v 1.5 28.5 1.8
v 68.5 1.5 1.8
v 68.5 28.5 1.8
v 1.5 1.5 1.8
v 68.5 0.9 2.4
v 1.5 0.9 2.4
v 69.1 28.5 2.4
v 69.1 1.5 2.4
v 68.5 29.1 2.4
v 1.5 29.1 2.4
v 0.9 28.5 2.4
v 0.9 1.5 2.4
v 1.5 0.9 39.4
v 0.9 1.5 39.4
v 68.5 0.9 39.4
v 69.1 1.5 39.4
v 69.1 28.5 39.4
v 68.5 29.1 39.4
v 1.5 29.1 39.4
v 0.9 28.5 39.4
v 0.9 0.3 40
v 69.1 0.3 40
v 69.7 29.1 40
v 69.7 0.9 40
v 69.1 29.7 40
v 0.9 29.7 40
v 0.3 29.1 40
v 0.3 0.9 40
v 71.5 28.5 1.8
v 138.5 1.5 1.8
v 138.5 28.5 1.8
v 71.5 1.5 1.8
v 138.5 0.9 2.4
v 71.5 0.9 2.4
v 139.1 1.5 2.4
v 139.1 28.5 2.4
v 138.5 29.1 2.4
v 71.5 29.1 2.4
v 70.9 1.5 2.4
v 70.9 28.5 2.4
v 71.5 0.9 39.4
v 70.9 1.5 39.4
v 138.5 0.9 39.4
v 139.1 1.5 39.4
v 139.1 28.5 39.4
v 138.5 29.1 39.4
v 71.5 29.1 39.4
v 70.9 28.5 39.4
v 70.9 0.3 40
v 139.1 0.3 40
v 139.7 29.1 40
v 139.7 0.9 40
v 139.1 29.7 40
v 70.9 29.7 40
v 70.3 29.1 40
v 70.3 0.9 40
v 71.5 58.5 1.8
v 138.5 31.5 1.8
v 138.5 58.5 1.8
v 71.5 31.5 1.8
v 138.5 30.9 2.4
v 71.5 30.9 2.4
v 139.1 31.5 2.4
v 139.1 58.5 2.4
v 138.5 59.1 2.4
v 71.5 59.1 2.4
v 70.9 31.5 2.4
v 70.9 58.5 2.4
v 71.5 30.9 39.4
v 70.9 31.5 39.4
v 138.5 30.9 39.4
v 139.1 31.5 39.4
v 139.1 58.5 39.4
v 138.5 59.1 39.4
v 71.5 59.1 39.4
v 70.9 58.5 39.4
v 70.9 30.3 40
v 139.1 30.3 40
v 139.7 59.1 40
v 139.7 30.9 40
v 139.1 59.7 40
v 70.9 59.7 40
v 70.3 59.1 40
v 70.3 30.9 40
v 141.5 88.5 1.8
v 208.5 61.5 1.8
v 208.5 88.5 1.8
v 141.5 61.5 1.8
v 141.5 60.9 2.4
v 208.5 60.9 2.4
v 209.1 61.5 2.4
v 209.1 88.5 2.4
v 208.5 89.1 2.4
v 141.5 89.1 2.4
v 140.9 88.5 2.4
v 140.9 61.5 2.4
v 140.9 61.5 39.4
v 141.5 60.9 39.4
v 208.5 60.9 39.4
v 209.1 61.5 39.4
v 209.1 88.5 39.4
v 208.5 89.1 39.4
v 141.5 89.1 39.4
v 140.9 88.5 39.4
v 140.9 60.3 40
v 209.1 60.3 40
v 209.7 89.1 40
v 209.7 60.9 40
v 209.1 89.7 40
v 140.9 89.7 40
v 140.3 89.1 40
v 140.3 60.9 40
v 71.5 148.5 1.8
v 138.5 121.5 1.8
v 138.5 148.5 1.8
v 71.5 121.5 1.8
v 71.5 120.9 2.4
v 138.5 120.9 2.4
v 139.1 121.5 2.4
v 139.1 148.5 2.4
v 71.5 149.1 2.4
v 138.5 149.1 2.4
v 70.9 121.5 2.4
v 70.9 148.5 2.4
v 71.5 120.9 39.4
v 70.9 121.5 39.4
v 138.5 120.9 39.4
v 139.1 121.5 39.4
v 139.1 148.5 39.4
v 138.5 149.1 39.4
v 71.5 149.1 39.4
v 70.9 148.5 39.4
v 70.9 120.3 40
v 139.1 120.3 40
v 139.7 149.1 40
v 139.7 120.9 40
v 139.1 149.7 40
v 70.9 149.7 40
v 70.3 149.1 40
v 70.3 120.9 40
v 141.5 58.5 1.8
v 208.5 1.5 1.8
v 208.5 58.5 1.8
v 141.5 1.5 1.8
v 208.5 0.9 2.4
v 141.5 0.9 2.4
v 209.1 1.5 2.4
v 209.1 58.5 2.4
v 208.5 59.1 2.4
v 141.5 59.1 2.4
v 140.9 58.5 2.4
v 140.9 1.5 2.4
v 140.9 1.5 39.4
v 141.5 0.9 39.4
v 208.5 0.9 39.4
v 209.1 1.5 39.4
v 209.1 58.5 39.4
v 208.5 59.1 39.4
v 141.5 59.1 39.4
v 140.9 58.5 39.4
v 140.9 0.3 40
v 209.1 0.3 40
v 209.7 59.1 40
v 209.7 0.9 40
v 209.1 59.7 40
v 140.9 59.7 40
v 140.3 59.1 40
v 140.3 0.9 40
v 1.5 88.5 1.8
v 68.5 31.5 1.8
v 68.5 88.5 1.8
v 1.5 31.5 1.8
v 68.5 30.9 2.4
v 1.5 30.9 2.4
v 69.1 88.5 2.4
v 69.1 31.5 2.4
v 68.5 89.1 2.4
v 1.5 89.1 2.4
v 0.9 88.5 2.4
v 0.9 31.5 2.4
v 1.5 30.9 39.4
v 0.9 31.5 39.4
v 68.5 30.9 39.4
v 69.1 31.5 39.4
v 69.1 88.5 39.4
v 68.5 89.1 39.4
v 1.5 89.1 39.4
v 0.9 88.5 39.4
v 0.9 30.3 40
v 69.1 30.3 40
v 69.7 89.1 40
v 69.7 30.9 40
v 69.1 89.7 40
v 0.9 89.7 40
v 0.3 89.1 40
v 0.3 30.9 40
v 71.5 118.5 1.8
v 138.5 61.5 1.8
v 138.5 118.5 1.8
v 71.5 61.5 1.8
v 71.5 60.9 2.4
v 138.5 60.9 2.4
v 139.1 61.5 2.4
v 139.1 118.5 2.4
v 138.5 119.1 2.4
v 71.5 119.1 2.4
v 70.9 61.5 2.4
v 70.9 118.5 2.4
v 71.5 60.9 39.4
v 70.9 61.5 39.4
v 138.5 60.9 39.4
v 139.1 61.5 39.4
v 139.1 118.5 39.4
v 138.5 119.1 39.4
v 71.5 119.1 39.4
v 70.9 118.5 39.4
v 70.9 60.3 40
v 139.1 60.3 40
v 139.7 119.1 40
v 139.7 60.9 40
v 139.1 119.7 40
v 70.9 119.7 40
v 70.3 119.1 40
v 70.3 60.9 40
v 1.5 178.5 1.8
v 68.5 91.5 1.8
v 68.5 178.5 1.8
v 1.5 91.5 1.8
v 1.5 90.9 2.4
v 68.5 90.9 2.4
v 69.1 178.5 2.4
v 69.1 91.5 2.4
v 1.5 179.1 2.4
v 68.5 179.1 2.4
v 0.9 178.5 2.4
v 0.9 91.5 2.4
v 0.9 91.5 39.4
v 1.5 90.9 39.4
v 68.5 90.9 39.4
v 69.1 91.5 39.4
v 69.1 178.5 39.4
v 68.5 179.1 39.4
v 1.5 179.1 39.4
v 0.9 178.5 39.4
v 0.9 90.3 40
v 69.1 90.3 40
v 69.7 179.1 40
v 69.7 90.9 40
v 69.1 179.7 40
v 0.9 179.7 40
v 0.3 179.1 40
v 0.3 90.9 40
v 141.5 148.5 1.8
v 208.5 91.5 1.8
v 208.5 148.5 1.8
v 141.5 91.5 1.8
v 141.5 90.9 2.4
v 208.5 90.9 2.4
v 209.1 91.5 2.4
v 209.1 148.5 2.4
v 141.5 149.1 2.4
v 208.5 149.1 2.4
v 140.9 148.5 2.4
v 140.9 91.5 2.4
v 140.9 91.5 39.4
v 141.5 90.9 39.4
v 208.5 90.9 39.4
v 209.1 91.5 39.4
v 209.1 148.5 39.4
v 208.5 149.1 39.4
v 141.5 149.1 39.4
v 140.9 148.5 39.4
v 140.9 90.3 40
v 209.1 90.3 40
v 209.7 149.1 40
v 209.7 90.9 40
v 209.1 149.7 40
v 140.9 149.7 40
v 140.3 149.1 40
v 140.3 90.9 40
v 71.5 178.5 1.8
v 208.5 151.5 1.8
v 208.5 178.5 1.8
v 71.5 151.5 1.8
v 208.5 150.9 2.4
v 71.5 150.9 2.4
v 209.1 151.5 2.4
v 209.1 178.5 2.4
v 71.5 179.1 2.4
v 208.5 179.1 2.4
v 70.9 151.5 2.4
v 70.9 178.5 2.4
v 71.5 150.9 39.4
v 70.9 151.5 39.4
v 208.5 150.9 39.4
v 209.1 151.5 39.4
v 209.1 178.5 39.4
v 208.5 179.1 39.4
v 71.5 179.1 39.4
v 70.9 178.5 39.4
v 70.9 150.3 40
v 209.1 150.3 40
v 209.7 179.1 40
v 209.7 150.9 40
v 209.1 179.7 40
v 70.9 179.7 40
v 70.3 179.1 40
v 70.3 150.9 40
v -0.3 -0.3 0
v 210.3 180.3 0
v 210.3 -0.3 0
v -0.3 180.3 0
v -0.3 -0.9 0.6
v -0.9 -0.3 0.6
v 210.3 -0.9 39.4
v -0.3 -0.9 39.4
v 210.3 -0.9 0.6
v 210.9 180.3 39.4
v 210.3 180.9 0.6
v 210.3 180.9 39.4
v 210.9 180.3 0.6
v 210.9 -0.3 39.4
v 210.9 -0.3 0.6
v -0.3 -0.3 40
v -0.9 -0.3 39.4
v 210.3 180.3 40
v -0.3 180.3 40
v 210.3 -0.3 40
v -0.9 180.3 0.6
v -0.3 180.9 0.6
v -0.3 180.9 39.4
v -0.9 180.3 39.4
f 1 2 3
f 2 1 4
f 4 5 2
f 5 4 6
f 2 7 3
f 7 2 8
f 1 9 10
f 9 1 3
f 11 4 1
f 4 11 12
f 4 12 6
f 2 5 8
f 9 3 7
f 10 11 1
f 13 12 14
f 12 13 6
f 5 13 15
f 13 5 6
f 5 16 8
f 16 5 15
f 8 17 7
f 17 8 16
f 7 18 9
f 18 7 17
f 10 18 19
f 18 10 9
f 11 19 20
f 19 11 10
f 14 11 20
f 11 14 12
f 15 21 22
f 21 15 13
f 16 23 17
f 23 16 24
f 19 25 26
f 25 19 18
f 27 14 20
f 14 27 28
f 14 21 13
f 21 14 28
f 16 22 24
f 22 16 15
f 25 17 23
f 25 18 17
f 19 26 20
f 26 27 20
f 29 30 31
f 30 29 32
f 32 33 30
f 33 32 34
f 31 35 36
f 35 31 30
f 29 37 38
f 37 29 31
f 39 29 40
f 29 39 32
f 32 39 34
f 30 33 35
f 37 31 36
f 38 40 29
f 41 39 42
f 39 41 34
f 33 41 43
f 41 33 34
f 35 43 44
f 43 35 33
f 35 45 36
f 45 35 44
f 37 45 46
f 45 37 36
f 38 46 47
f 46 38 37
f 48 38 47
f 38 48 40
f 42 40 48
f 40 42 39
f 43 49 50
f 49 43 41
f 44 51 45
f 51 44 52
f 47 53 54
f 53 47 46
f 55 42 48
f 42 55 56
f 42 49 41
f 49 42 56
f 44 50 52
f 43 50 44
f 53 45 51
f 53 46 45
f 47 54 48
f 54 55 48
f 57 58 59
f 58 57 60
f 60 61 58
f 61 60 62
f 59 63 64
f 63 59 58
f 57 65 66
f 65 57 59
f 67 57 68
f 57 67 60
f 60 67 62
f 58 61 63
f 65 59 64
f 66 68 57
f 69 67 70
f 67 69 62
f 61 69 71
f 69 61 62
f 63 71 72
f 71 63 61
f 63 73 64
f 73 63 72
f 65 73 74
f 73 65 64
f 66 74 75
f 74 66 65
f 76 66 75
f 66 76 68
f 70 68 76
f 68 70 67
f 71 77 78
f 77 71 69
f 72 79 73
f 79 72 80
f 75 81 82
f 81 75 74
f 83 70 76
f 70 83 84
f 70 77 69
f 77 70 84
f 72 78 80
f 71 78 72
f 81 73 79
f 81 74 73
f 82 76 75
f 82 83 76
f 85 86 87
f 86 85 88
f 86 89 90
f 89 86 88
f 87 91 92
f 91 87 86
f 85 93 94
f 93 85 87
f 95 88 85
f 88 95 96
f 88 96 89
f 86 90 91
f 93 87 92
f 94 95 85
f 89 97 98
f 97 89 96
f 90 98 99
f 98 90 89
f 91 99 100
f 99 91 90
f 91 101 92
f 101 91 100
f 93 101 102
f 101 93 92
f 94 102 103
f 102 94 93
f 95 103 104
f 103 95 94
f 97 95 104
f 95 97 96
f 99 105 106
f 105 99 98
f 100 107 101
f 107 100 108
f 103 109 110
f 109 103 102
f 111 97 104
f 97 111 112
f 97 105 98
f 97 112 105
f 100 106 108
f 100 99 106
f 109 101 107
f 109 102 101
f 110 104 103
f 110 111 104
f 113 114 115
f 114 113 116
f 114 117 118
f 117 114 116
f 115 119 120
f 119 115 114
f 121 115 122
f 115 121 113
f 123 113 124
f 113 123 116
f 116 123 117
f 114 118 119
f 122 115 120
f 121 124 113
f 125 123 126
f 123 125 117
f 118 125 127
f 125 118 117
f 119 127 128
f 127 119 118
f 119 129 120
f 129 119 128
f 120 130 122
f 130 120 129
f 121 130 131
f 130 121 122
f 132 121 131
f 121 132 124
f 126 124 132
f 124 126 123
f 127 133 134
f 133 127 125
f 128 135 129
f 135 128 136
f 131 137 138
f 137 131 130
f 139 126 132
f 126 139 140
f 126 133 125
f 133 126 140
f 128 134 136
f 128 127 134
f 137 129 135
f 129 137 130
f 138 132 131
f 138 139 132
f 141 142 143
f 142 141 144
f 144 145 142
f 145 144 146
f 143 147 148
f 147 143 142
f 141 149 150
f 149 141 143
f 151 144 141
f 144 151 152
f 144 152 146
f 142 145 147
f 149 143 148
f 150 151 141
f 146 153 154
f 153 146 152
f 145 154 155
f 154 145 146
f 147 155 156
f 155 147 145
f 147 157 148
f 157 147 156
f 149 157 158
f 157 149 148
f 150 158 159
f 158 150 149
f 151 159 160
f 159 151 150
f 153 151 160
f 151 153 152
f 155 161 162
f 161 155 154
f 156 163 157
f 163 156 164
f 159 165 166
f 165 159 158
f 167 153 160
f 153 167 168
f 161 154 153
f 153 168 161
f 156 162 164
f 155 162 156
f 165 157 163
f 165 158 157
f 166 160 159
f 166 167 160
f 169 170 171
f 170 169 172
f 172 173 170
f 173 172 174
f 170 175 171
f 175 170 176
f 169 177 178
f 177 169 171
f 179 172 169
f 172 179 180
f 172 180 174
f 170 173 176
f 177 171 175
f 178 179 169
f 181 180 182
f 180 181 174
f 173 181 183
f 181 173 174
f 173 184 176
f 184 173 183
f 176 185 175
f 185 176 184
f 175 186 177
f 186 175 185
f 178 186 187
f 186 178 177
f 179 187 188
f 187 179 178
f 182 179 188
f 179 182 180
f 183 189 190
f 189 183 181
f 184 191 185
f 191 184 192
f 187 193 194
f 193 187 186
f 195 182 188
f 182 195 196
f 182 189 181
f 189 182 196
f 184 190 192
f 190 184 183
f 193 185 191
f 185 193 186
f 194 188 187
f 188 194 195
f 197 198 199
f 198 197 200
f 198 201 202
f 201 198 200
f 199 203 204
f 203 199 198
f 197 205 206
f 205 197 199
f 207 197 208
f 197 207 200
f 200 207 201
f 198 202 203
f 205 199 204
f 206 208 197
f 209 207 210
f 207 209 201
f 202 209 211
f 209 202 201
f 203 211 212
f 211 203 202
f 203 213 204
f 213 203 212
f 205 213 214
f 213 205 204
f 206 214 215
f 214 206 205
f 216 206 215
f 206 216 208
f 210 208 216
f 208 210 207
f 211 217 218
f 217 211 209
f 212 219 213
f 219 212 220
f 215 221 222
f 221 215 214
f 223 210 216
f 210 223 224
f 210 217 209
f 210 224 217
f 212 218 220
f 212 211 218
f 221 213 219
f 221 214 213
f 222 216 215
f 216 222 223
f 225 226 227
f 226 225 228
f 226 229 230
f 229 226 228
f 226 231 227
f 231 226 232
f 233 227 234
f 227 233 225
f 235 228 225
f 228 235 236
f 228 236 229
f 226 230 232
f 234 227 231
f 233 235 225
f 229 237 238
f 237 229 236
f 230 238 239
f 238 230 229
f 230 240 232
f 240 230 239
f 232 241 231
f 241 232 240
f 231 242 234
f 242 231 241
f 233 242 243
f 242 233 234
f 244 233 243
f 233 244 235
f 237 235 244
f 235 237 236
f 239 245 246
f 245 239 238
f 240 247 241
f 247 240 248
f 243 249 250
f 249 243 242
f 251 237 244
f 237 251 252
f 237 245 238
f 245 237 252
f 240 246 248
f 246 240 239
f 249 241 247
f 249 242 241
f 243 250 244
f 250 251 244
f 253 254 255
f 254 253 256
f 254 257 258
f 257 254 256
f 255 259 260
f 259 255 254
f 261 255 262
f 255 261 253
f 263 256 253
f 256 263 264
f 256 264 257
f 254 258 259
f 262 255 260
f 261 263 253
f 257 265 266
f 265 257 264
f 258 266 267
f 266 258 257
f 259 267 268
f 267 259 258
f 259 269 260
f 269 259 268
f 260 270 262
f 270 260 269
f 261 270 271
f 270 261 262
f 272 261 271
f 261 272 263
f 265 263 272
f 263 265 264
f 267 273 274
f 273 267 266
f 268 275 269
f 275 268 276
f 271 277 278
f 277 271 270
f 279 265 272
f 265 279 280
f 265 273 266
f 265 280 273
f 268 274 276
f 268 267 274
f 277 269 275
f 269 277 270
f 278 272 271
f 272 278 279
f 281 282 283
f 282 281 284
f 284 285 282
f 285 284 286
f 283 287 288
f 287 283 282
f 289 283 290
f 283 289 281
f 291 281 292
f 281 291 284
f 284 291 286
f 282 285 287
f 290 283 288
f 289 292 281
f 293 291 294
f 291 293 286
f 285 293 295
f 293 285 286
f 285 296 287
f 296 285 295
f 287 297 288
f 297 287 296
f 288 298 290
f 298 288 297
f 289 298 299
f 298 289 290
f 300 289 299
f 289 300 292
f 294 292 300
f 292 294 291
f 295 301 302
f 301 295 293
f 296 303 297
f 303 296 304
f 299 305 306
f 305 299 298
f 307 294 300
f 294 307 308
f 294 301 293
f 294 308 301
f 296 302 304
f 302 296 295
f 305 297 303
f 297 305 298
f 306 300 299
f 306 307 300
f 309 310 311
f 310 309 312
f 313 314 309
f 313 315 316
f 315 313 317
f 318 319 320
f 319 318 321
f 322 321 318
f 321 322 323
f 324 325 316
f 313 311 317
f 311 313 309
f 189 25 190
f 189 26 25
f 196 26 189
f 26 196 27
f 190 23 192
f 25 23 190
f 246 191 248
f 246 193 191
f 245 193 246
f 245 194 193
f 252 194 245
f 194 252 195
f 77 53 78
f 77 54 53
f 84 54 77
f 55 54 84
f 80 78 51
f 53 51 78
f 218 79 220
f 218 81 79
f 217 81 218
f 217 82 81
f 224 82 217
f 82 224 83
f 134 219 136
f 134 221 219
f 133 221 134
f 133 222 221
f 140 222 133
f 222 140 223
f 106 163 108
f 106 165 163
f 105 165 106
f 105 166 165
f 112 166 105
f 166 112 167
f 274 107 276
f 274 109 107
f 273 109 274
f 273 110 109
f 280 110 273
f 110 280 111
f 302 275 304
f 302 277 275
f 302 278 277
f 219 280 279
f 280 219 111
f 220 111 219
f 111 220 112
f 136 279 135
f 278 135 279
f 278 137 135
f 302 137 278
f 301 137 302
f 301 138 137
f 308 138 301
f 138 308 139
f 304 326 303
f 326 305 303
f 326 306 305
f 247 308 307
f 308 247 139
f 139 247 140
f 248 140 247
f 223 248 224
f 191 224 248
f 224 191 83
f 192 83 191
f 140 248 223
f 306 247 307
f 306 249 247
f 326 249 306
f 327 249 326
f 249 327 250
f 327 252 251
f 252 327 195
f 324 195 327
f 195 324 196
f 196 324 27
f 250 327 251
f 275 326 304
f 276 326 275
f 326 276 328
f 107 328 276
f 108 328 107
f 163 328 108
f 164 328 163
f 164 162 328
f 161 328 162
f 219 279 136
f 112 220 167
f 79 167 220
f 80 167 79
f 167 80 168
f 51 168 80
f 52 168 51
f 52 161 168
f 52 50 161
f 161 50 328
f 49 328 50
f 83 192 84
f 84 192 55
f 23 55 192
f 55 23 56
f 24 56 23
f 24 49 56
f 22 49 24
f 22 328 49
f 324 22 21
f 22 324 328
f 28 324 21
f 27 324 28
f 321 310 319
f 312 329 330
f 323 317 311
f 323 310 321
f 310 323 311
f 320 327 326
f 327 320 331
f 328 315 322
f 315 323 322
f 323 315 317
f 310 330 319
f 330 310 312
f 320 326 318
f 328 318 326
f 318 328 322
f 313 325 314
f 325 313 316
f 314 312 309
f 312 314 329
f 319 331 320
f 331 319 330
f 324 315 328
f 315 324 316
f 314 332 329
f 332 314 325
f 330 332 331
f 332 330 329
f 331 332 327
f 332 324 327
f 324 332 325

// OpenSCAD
// file: ../functions/vectors2D.scad
/* * * * * * * * * * * * * * * * * * * * * * * * * * * * * * * * * * * * *\
 * Copyright (C) Claus Schrammel <claus@f05fk.net>                       *
 *                                                                       *
 * This program is free software: you can redistribute it and/or modify  *
 * it under the terms of the GNU General Public License as published by  *
 * the Free Software Foundation, either version 3 of the License, or     *
 * (at your option) any later version.                                   *
 *                                                                       *
 * This program is distributed in the hope that it will be useful,       *
 * but WITHOUT ANY WARRANTY; without even the implied warranty of        *
 * MERCHANTABILITY or FITNESS FOR A PARTICULAR PURPOSE.  See the         *
 * GNU General Public License for more details.                          *
 *                                                                       *
 * You should have received a copy of the GNU General Public License     *
 * along with this program.  If not, see <http://www.gnu.org/licenses/>. *
 *                                                                       *
 * SPDX-License-Identifier: GPL-3.0-or-later                             *
\* * * * * * * * * * * * * * * * * * * * * * * * * * * * * * * * * * * * */

include <utils.scad>

function normal_vector_2D(vector) = [-vector.y, vector.x];
function unit_vector_2D(vector) = vector / norm(vector);

/*
 * Calculates the coefficient for v1 to get from p1 to the intersection point of the two lines p1/v1 and p2/v2:
 * intersection_point = p1 + v1 * intersection_coefficient1.
 */
function intersection_coefficient1(p1, v1, p2, v2) = ( v2.x * (p1.y - p2.y) - v2.y * (p1.x - p2.x) ) / (v1.x * v2.y - v1.y * v2.x);

/*
 * Calculates the coefficient for v2 to get from p2 to the intersection point of the two lines p1/v1 and p2/v2:
 * intersection_point = p2 + v2 * intersection_coefficient2.
 */
function intersection_coefficient2(p1, v1, p2, v2) = intersection_coefficient1(p2, v2, p1, v1);

/*
 * Calculates the intersection point of the two lines p1/v1 and p2/v2.
 */
function intersection_point(p1, v1, p2, v2) = p1 + v1 * intersection_coefficient1(p1, v1, p2, v2);
// file: ../functions/utils.scad
/* * * * * * * * * * * * * * * * * * * * * * * * * * * * * * * * * * * * *\
 * Copyright (C) Claus Schrammel <claus@f05fk.net>                       *
 *                                                                       *
 * This program is free software: you can redistribute it and/or modify  *
 * it under the terms of the GNU General Public License as published by  *
 * the Free Software Foundation, either version 3 of the License, or     *
 * (at your option) any later version.                                   *
 *                                                                       *
 * This program is distributed in the hope that it will be useful,       *
 * but WITHOUT ANY WARRANTY; without even the implied warranty of        *
 * MERCHANTABILITY or FITNESS FOR A PARTICULAR PURPOSE.  See the         *
 * GNU General Public License for more details.                          *
 *                                                                       *
 * You should have received a copy of the GNU General Public License     *
 * along with this program.  If not, see <http://www.gnu.org/licenses/>. *
 *                                                                       *
 * SPDX-License-Identifier: GPL-3.0-or-later                             *
\* * * * * * * * * * * * * * * * * * * * * * * * * * * * * * * * * * * * */

// the modulo operator % creates negative results for negative inputs n
function modulo(n, m) = ((n % m) + m) % m;

function cyclic_array(array, index) = array[modulo(index, len(array))];
// file: ../functions/polygons.scad
/* * * * * * * * * * * * * * * * * * * * * * * * * * * * * * * * * * * * *\
 * Copyright (C) Claus Schrammel <claus@f05fk.net>                       *
 *                                                                       *
 * This program is free software: you can redistribute it and/or modify  *
 * it under the terms of the GNU General Public License as published by  *
 * the Free Software Foundation, either version 3 of the License, or     *
 * (at your option) any later version.                                   *
 *                                                                       *
 * This program is distributed in the hope that it will be useful,       *
 * but WITHOUT ANY WARRANTY; without even the implied warranty of        *
 * MERCHANTABILITY or FITNESS FOR A PARTICULAR PURPOSE.  See the         *
 * GNU General Public License for more details.                          *
 *                                                                       *
 * You should have received a copy of the GNU General Public License     *
 * along with this program.  If not, see <http://www.gnu.org/licenses/>. *
 *                                                                       *
 * SPDX-License-Identifier: GPL-3.0-or-later                             *
\* * * * * * * * * * * * * * * * * * * * * * * * * * * * * * * * * * * * */

include <utils.scad>
include <vectors2D.scad>

/*
 * Shrinks the polygon by moving the edges "inwards" by the given distance.
 * The points need to be given in the counter-clockwise order, i.e. applying the
 * right-hand rule with the thumb pointing in the z direction.
 */
function shrink_edges(points, distance) =
    [ for (i = [0 : 1 : len(points) - 1])
        let (p1 = cyclic_array(points, i - 1), p2 = cyclic_array(points, i), p3 = cyclic_array(points, i + 1),
                v1 = p2 - p1, v2 = p3 - p2,
                n1 = unit_vector_2D(normal_vector_2D(v1)), n2 = unit_vector_2D(normal_vector_2D(v2)))
            intersection_point(p1 + n1 * distance, v1, p2 + n2 * distance, v2)
    ];

/*
 * Grows the polygon by moving the edges "outwards" by the given distance.
 * The points need to be given in the counter-clockwise order, i.e. applying the
 * right-hand rule with the thumb pointing in the z direction.
 */
function grow_edges(points, distance) = shrink_edges(points, -distance);

/*
 * Flattens the corners of the polygon by cutting off at the intersection points where one of the edges
 * is moved "inwards" by the given distance, while the other edge is not, and vice-versa.
 * The points need to be given in the counter-clockwise order, i.e. applying the
 * right-hand rule with the thumb pointing in the z direction.
 */
function flatten_corners(points, distance) = 
    [ for (i = [0 : 1 : len(points) - 1])
        let (p1 = cyclic_array(points, i - 1), p2 = cyclic_array(points, i), p3 = cyclic_array(points, i + 1),
                v1 = p2 - p1, v2 = p3 - p2,
                n1 = unit_vector_2D(normal_vector_2D(v1)), n2 = unit_vector_2D(normal_vector_2D(v2)))
            each [
                intersection_point(p1, v1, p2 + n2 * distance, v2),
                intersection_point(p1 + n1 * distance, v1, p2, v2)
            ]
    ];
// main file
/* * * * * * * * * * * * * * * * * * * * * * * * * * * * * * * * * * * * *\
 * Copyright (C) Claus Schrammel <claus@f05fk.net>                       *
 *                                                                       *
 * This program is free software: you can redistribute it and/or modify  *
 * it under the terms of the GNU General Public License as published by  *
 * the Free Software Foundation, either version 3 of the License, or     *
 * (at your option) any later version.                                   *
 *                                                                       *
 * This program is distributed in the hope that it will be useful,       *
 * but WITHOUT ANY WARRANTY; without even the implied warranty of        *
 * MERCHANTABILITY or FITNESS FOR A PARTICULAR PURPOSE.  See the         *
 * GNU General Public License for more details.                          *
 *                                                                       *
 * You should have received a copy of the GNU General Public License     *
 * along with this program.  If not, see <http://www.gnu.org/licenses/>. *
 *                                                                       *
 * SPDX-License-Identifier: GPL-3.0-or-later                             *
\* * * * * * * * * * * * * * * * * * * * * * * * * * * * * * * * * * * * */

use <../modules/PrismaChamfered.scad>

DEPTH = 40;
CELL_WIDTH = 70;
CELL_HEIGHT = 30;
THICKNESS = 1.8;
DELTA = THICKNESS / 2;
CHAMFER = 0.6;

x0a = 0 * CELL_WIDTH - DELTA;
x0b = 0 * CELL_WIDTH + DELTA;
x1a = 1 * CELL_WIDTH - DELTA;
x1b = 1 * CELL_WIDTH + DELTA;
x2a = 2 * CELL_WIDTH - DELTA;
x2b = 2 * CELL_WIDTH + DELTA;
x3a = 3 * CELL_WIDTH - DELTA;
x3b = 3 * CELL_WIDTH + DELTA;

y0a = 0 * CELL_HEIGHT - DELTA;
y0b = 0 * CELL_HEIGHT + DELTA;
y1a = 1 * CELL_HEIGHT - DELTA;
y1b = 1 * CELL_HEIGHT + DELTA;
y2a = 2 * CELL_HEIGHT - DELTA;
y2b = 2 * CELL_HEIGHT + DELTA;
y3a = 3 * CELL_HEIGHT - DELTA;
y3b = 3 * CELL_HEIGHT + DELTA;
y4a = 4 * CELL_HEIGHT - DELTA;
y4b = 4 * CELL_HEIGHT + DELTA;
y5a = 5 * CELL_HEIGHT - DELTA;
y5b = 5 * CELL_HEIGHT + DELTA;
y6a = 6 * CELL_HEIGHT - DELTA;
y6b = 6 * CELL_HEIGHT + DELTA;

difference() {
    PrismaChamfered(points = sqre(x0a, y0a, x3b, y6b), height = DEPTH, chamfer = CHAMFER);

    translate([0, 0, THICKNESS]) {
        // row 1
        PrismaChamfered(points = sqre(x0b, y0b, x1a, y1a), height = DEPTH - THICKNESS, chamfer = CHAMFER, invert_top = true);
        PrismaChamfered(points = sqre(x1b, y0b, x2a, y1a), height = DEPTH - THICKNESS, chamfer = CHAMFER, invert_top = true);
        //PrismaChamfered(points = sqre(x2b, y0b, x3a, y1a), height = DEPTH - THICKNESS, chamfer = CHAMFER, invert_top = true);
        // row 2
        //PrismaChamfered(points = sqre(x0b, y1b, x1a, y2a), height = DEPTH - THICKNESS, chamfer = CHAMFER, invert_top = true);
        PrismaChamfered(points = sqre(x1b, y1b, x2a, y2a), height = DEPTH - THICKNESS, chamfer = CHAMFER, invert_top = true);
        //PrismaChamfered(points = sqre(x2b, y1b, x3a, y2a), height = DEPTH - THICKNESS, chamfer = CHAMFER, invert_top = true);
        // row 3
        //PrismaChamfered(points = sqre(x0b, y2b, x1a, y3a), height = DEPTH - THICKNESS, chamfer = CHAMFER, invert_top = true);
        //PrismaChamfered(points = sqre(x1b, y2b, x2a, y3a), height = DEPTH - THICKNESS, chamfer = CHAMFER, invert_top = true);
        PrismaChamfered(points = sqre(x2b, y2b, x3a, y3a), height = DEPTH - THICKNESS, chamfer = CHAMFER, invert_top = true);
        // row 4
        //PrismaChamfered(points = sqre(x0b, y3b, x1a, y4a), height = DEPTH - THICKNESS, chamfer = CHAMFER, invert_top = true);
        //PrismaChamfered(points = sqre(x1b, y3b, x2a, y4a), height = DEPTH - THICKNESS, chamfer = CHAMFER, invert_top = true);
        //PrismaChamfered(points = sqre(x2b, y3b, x3a, y4a), height = DEPTH - THICKNESS, chamfer = CHAMFER, invert_top = true);
        // row 5
        //PrismaChamfered(points = sqre(x0b, y4b, x1a, y5a), height = DEPTH - THICKNESS, chamfer = CHAMFER, invert_top = true);
        PrismaChamfered(points = sqre(x1b, y4b, x2a, y5a), height = DEPTH - THICKNESS, chamfer = CHAMFER, invert_top = true);
        //PrismaChamfered(points = sqre(x2b, y4b, x3a, y5a), height = DEPTH - THICKNESS, chamfer = CHAMFER, invert_top = true);
        // row 6
        //PrismaChamfered(points = sqre(x0b, y5b, x1a, y6a), height = DEPTH - THICKNESS, chamfer = CHAMFER, invert_top = true);
        //PrismaChamfered(points = sqre(x1b, y5b, x2a, y6a), height = DEPTH - THICKNESS, chamfer = CHAMFER, invert_top = true);
        //PrismaChamfered(points = sqre(x2b, y5b, x3a, y6a), height = DEPTH - THICKNESS, chamfer = CHAMFER, invert_top = true);
        // special fields

        PrismaChamfered(points = sqre(x2b, y0b, x3a, y2a), height = DEPTH - THICKNESS, chamfer = CHAMFER, invert_top = true);
        PrismaChamfered(points = sqre(x0b, y1b, x1a, y3a), height = DEPTH - THICKNESS, chamfer = CHAMFER, invert_top = true);
        PrismaChamfered(points = sqre(x1b, y2b, x2a, y4a), height = DEPTH - THICKNESS, chamfer = CHAMFER, invert_top = true);
        PrismaChamfered(points = sqre(x0b, y3b, x1a, y6a), height = DEPTH - THICKNESS, chamfer = CHAMFER, invert_top = true);
        PrismaChamfered(points = sqre(x2b, y3b, x3a, y5a), height = DEPTH - THICKNESS, chamfer = CHAMFER, invert_top = true);
        PrismaChamfered(points = sqre(x1b, y5b, x3a, y6a), height = DEPTH - THICKNESS, chamfer = CHAMFER, invert_top = true);
    }
}

function sqre(xmin, ymin, xmax, ymax) = [[xmin, ymin], [xmax, ymin], [xmax, ymax], [xmin, ymax]];
